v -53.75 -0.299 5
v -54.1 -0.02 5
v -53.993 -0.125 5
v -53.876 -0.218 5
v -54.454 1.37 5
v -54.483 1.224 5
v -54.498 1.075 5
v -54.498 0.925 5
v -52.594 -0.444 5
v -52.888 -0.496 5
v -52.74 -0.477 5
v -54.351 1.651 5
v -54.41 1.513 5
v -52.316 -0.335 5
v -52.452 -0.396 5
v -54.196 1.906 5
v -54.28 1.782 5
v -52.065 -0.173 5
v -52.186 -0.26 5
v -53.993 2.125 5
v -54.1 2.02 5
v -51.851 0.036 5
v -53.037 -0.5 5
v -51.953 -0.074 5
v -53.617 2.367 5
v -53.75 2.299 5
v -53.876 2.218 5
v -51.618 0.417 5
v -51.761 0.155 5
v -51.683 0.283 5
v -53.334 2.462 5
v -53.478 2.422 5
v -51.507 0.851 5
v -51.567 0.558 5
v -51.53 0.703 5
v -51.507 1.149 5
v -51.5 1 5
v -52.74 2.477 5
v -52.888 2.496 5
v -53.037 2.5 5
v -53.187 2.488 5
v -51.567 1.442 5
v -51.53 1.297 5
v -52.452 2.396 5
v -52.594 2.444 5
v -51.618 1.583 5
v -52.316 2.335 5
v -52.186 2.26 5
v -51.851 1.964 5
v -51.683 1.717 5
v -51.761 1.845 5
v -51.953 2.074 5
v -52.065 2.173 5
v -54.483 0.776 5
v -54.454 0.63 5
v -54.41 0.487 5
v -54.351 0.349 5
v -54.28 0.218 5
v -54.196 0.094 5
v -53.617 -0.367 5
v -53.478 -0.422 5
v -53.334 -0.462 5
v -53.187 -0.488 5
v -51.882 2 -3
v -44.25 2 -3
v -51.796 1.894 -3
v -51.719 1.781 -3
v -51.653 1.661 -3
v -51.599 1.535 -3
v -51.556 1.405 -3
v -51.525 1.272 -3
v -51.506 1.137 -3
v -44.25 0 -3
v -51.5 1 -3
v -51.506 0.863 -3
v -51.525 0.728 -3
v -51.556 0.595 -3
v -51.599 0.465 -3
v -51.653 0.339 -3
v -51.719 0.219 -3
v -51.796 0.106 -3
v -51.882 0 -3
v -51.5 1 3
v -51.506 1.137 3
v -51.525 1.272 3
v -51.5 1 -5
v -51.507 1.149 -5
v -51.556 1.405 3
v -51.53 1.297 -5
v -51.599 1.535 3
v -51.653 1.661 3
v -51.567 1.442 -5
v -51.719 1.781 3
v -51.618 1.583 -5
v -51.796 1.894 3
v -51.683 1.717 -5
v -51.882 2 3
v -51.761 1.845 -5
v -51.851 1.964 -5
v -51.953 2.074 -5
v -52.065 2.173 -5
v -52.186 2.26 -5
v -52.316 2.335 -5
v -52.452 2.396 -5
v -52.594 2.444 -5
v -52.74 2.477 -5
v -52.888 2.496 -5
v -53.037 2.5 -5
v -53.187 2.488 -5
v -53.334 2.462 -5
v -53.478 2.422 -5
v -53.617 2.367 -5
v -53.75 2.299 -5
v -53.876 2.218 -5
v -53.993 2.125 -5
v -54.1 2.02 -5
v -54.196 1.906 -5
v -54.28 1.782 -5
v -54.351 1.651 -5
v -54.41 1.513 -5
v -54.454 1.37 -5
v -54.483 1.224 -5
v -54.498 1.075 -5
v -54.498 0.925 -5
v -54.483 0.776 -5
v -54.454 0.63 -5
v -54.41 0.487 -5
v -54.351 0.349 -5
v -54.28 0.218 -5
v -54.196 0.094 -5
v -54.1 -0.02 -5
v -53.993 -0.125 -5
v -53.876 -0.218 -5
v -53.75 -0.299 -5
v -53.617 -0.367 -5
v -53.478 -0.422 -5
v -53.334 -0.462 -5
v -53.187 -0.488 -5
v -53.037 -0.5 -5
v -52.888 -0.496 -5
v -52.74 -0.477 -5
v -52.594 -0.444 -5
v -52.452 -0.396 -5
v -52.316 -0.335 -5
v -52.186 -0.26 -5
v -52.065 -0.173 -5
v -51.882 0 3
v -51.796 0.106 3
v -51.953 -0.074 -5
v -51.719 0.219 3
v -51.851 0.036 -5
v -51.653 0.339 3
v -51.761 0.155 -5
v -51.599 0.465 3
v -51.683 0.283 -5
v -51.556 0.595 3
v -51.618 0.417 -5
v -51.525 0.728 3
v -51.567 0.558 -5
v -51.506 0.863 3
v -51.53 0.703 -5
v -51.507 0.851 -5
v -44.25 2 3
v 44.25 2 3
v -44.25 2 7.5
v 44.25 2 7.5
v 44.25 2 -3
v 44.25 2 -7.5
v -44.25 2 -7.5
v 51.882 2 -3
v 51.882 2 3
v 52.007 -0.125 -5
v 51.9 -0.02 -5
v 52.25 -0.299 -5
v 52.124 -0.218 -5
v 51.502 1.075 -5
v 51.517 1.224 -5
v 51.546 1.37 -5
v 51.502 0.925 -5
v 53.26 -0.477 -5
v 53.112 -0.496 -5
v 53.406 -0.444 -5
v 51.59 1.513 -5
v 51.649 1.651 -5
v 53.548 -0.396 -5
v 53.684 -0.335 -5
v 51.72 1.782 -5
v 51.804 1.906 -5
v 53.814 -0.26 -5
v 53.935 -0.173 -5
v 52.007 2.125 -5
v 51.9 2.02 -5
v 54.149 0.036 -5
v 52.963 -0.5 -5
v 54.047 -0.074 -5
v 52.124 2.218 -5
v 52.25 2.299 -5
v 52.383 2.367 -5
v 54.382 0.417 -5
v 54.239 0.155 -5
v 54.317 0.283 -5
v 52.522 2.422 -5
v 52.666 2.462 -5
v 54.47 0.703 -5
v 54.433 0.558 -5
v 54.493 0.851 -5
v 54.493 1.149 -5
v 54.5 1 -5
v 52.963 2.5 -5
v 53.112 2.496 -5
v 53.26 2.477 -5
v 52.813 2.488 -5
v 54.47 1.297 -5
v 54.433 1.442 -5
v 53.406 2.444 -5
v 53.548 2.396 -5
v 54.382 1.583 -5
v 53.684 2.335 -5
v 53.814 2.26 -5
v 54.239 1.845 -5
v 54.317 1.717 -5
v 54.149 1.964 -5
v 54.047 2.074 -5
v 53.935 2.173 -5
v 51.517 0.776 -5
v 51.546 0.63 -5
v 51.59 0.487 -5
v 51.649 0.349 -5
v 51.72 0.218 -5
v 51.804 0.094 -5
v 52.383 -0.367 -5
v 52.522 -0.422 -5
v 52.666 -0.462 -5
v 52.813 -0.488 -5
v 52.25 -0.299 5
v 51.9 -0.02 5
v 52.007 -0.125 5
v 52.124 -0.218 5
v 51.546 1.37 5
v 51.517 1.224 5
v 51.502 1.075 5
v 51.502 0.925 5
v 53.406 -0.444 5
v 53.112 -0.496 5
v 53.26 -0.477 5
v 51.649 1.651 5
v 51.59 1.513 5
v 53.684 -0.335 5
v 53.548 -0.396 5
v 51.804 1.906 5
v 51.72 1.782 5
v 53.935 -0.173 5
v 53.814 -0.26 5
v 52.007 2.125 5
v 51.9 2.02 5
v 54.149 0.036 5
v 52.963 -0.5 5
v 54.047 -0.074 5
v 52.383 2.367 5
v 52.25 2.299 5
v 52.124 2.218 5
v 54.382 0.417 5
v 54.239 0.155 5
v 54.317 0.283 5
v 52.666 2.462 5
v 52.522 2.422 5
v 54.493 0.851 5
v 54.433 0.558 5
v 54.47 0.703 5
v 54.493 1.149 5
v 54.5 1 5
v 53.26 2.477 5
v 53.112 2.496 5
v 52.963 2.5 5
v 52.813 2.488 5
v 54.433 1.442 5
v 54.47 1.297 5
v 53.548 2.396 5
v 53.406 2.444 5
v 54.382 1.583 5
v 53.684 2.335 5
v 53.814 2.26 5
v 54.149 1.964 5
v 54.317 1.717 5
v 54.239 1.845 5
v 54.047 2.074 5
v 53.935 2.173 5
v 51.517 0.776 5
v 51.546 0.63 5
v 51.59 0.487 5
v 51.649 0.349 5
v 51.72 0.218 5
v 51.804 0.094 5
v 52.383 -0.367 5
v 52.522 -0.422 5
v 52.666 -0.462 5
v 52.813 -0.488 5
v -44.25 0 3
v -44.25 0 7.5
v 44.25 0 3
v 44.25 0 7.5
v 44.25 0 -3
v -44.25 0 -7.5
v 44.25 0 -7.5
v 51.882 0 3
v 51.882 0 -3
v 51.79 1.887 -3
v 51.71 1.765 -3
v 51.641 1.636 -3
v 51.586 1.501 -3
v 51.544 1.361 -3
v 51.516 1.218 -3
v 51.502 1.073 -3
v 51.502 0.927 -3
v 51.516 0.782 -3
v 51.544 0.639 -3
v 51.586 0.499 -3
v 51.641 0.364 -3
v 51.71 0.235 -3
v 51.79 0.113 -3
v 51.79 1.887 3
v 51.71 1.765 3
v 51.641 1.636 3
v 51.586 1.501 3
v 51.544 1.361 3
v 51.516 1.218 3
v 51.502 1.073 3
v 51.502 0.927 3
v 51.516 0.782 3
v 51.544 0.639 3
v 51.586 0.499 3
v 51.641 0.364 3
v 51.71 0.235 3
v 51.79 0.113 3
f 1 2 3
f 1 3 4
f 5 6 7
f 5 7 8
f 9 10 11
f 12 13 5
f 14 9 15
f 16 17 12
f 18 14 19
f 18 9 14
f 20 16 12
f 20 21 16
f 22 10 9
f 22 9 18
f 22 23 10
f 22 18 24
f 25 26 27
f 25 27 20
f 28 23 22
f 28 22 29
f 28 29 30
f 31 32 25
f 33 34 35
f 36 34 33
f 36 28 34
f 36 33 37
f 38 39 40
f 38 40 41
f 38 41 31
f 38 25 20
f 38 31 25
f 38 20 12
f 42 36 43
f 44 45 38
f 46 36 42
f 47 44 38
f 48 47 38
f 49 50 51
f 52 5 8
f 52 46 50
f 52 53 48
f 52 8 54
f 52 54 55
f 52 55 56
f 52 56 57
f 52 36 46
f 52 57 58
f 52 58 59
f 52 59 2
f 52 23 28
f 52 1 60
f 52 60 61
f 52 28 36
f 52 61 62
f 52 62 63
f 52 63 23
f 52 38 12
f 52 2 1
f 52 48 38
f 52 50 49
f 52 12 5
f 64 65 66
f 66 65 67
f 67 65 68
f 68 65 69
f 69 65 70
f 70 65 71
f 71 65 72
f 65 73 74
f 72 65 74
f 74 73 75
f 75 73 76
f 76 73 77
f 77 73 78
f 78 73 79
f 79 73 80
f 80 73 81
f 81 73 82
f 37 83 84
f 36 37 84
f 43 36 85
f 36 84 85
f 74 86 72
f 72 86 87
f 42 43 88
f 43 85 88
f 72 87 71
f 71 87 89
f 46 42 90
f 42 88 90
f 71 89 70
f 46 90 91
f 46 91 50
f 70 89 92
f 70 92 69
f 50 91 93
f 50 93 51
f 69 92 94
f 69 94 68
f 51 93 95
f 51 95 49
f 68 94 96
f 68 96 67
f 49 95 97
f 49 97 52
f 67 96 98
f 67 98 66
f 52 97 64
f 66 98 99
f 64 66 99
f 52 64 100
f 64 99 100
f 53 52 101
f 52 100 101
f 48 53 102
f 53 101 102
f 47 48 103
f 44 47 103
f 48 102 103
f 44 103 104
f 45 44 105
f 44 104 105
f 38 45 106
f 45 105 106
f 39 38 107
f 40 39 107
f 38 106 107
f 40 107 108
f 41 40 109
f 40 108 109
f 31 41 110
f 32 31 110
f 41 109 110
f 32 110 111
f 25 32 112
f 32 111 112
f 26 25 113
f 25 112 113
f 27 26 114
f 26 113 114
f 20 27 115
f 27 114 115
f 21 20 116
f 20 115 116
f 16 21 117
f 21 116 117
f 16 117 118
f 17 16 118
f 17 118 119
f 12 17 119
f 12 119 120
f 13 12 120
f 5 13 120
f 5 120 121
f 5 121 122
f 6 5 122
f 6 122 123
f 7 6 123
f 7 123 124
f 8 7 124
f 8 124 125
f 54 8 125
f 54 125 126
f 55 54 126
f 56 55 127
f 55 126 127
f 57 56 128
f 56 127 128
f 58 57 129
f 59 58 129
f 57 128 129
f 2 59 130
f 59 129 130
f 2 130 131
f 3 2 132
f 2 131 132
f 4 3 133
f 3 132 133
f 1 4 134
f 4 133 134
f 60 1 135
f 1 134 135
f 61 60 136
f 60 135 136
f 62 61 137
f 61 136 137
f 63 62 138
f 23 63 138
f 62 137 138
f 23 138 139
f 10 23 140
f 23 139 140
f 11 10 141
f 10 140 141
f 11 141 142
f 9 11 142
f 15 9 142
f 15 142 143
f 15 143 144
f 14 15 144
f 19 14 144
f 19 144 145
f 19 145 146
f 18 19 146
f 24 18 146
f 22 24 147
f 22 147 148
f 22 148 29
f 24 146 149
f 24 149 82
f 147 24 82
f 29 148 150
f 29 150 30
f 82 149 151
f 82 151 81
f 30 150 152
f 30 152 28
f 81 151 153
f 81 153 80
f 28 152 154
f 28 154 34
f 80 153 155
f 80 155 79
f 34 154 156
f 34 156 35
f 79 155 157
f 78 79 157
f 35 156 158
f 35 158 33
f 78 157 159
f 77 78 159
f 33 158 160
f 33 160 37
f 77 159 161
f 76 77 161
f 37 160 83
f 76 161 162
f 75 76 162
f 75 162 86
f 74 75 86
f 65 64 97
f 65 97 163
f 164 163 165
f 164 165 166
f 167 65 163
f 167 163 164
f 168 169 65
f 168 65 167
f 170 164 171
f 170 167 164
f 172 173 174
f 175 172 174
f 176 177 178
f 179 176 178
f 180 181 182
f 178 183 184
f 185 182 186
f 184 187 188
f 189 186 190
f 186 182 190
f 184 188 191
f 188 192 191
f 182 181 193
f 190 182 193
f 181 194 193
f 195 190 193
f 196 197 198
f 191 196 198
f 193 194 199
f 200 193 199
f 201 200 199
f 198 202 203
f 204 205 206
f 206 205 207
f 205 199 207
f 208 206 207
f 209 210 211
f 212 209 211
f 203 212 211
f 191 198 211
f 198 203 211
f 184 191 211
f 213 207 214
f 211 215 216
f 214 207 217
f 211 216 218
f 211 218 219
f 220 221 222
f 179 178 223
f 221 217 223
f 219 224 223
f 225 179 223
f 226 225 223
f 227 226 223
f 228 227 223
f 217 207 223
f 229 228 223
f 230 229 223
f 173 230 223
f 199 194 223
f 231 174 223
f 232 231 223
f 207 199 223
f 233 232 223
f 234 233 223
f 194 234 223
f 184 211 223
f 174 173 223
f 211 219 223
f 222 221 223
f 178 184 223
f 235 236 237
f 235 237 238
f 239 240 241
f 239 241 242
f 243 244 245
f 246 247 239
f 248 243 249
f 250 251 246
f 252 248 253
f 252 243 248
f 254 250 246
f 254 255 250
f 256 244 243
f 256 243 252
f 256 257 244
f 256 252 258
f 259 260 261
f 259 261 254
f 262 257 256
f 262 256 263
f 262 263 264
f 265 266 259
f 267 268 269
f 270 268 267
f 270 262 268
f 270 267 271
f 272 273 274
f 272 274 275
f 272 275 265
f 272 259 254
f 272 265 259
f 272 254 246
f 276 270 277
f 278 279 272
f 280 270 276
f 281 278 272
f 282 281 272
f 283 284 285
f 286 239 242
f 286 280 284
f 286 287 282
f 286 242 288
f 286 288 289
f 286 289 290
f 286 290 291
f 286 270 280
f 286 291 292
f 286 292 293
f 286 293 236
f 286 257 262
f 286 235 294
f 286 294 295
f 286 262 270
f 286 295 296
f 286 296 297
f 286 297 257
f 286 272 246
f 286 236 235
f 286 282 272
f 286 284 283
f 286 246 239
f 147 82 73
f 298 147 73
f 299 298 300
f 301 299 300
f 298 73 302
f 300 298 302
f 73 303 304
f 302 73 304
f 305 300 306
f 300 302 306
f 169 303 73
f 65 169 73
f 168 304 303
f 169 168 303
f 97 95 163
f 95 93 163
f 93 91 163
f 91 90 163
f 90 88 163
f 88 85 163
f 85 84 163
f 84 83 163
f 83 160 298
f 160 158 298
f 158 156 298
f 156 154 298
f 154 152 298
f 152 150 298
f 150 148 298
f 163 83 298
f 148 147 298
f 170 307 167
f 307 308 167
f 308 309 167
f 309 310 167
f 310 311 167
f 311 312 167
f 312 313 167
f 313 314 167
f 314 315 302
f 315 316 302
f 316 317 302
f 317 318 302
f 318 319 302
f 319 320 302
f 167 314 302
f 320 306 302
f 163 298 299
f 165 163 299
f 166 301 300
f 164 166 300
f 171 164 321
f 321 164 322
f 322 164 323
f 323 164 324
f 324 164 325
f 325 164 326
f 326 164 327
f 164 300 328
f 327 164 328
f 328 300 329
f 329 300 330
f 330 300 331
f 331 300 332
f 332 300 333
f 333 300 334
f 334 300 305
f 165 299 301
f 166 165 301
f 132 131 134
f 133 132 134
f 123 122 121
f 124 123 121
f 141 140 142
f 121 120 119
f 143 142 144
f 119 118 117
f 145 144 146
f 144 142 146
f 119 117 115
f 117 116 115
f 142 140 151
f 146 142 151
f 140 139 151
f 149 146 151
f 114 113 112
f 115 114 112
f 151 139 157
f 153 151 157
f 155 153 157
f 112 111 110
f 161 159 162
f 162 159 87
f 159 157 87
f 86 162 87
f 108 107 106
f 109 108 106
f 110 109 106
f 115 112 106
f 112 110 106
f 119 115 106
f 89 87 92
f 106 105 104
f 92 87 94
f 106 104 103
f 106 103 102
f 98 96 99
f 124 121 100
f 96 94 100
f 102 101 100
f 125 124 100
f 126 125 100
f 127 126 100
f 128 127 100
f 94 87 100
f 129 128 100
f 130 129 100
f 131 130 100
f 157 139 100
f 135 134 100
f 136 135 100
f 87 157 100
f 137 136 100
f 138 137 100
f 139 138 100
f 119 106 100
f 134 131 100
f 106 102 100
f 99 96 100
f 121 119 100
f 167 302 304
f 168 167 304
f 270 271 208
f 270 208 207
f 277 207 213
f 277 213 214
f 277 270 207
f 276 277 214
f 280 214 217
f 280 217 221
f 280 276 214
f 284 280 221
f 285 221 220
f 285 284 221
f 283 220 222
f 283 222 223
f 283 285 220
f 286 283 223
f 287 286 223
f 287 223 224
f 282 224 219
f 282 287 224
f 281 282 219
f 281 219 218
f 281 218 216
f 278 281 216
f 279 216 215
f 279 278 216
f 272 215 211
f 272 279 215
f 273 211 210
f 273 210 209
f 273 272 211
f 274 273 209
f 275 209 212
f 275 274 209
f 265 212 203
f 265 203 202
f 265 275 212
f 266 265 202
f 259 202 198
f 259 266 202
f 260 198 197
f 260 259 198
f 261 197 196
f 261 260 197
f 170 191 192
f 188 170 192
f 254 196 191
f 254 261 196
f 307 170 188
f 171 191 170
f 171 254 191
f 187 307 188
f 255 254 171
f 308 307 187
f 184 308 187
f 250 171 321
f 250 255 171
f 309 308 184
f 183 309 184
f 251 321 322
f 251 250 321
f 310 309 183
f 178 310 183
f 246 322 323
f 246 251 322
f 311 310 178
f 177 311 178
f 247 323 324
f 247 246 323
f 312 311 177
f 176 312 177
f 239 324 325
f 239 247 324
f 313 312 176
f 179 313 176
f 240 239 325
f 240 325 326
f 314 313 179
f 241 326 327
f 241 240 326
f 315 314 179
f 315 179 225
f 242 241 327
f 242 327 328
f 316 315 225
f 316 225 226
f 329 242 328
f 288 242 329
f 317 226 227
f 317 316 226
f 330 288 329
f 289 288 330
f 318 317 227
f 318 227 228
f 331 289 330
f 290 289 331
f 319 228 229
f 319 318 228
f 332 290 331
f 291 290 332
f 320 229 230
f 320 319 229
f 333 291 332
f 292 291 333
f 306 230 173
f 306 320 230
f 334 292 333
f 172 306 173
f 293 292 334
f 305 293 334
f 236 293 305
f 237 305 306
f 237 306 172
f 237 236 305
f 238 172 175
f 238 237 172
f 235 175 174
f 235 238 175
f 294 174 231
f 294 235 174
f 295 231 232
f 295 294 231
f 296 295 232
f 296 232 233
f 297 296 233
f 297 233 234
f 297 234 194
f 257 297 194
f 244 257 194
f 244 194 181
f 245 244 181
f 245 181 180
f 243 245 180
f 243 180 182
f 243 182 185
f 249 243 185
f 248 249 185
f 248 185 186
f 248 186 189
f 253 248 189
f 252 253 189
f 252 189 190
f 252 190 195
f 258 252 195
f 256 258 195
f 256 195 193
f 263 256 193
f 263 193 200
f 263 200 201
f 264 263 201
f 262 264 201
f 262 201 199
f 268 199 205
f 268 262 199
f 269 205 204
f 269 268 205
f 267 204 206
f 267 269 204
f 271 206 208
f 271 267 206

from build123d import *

# Parameters (mm, degrees)
EXTRUDE_1_DEPTH = 2
SKETCH_2_R      = 1.5
EXTRUDE_2_DEPTH = 5


with BuildPart() as part:
    # 草图1 → 凸台-拉伸1 (new body)
    with BuildSketch(Plane(origin=(0, 0, 0), x_dir=(1, 0, 0), z_dir=(0, 1, 0))):
        Polygon((44.25, 7.5), (-44.25, 7.5), (-44.25, 3), (-53, 3), (-53, -3), (-44.25, -3), (-44.25, -7.5), (44.25, -7.5), (44.25, -3), (53, -3), (53, 3), (44.25, 3), align=None)
    extrude(amount=EXTRUDE_1_DEPTH)

    # 草图2 → 凸台-拉伸2 (add, symmetric)
    with BuildSketch(Plane.XY):
        with Locations((-53, 1)):
            Circle(SKETCH_2_R)
        with Locations((53, 1)):
            Circle(SKETCH_2_R)
    extrude(amount=EXTRUDE_2_DEPTH, both=True)


solid = part.part
